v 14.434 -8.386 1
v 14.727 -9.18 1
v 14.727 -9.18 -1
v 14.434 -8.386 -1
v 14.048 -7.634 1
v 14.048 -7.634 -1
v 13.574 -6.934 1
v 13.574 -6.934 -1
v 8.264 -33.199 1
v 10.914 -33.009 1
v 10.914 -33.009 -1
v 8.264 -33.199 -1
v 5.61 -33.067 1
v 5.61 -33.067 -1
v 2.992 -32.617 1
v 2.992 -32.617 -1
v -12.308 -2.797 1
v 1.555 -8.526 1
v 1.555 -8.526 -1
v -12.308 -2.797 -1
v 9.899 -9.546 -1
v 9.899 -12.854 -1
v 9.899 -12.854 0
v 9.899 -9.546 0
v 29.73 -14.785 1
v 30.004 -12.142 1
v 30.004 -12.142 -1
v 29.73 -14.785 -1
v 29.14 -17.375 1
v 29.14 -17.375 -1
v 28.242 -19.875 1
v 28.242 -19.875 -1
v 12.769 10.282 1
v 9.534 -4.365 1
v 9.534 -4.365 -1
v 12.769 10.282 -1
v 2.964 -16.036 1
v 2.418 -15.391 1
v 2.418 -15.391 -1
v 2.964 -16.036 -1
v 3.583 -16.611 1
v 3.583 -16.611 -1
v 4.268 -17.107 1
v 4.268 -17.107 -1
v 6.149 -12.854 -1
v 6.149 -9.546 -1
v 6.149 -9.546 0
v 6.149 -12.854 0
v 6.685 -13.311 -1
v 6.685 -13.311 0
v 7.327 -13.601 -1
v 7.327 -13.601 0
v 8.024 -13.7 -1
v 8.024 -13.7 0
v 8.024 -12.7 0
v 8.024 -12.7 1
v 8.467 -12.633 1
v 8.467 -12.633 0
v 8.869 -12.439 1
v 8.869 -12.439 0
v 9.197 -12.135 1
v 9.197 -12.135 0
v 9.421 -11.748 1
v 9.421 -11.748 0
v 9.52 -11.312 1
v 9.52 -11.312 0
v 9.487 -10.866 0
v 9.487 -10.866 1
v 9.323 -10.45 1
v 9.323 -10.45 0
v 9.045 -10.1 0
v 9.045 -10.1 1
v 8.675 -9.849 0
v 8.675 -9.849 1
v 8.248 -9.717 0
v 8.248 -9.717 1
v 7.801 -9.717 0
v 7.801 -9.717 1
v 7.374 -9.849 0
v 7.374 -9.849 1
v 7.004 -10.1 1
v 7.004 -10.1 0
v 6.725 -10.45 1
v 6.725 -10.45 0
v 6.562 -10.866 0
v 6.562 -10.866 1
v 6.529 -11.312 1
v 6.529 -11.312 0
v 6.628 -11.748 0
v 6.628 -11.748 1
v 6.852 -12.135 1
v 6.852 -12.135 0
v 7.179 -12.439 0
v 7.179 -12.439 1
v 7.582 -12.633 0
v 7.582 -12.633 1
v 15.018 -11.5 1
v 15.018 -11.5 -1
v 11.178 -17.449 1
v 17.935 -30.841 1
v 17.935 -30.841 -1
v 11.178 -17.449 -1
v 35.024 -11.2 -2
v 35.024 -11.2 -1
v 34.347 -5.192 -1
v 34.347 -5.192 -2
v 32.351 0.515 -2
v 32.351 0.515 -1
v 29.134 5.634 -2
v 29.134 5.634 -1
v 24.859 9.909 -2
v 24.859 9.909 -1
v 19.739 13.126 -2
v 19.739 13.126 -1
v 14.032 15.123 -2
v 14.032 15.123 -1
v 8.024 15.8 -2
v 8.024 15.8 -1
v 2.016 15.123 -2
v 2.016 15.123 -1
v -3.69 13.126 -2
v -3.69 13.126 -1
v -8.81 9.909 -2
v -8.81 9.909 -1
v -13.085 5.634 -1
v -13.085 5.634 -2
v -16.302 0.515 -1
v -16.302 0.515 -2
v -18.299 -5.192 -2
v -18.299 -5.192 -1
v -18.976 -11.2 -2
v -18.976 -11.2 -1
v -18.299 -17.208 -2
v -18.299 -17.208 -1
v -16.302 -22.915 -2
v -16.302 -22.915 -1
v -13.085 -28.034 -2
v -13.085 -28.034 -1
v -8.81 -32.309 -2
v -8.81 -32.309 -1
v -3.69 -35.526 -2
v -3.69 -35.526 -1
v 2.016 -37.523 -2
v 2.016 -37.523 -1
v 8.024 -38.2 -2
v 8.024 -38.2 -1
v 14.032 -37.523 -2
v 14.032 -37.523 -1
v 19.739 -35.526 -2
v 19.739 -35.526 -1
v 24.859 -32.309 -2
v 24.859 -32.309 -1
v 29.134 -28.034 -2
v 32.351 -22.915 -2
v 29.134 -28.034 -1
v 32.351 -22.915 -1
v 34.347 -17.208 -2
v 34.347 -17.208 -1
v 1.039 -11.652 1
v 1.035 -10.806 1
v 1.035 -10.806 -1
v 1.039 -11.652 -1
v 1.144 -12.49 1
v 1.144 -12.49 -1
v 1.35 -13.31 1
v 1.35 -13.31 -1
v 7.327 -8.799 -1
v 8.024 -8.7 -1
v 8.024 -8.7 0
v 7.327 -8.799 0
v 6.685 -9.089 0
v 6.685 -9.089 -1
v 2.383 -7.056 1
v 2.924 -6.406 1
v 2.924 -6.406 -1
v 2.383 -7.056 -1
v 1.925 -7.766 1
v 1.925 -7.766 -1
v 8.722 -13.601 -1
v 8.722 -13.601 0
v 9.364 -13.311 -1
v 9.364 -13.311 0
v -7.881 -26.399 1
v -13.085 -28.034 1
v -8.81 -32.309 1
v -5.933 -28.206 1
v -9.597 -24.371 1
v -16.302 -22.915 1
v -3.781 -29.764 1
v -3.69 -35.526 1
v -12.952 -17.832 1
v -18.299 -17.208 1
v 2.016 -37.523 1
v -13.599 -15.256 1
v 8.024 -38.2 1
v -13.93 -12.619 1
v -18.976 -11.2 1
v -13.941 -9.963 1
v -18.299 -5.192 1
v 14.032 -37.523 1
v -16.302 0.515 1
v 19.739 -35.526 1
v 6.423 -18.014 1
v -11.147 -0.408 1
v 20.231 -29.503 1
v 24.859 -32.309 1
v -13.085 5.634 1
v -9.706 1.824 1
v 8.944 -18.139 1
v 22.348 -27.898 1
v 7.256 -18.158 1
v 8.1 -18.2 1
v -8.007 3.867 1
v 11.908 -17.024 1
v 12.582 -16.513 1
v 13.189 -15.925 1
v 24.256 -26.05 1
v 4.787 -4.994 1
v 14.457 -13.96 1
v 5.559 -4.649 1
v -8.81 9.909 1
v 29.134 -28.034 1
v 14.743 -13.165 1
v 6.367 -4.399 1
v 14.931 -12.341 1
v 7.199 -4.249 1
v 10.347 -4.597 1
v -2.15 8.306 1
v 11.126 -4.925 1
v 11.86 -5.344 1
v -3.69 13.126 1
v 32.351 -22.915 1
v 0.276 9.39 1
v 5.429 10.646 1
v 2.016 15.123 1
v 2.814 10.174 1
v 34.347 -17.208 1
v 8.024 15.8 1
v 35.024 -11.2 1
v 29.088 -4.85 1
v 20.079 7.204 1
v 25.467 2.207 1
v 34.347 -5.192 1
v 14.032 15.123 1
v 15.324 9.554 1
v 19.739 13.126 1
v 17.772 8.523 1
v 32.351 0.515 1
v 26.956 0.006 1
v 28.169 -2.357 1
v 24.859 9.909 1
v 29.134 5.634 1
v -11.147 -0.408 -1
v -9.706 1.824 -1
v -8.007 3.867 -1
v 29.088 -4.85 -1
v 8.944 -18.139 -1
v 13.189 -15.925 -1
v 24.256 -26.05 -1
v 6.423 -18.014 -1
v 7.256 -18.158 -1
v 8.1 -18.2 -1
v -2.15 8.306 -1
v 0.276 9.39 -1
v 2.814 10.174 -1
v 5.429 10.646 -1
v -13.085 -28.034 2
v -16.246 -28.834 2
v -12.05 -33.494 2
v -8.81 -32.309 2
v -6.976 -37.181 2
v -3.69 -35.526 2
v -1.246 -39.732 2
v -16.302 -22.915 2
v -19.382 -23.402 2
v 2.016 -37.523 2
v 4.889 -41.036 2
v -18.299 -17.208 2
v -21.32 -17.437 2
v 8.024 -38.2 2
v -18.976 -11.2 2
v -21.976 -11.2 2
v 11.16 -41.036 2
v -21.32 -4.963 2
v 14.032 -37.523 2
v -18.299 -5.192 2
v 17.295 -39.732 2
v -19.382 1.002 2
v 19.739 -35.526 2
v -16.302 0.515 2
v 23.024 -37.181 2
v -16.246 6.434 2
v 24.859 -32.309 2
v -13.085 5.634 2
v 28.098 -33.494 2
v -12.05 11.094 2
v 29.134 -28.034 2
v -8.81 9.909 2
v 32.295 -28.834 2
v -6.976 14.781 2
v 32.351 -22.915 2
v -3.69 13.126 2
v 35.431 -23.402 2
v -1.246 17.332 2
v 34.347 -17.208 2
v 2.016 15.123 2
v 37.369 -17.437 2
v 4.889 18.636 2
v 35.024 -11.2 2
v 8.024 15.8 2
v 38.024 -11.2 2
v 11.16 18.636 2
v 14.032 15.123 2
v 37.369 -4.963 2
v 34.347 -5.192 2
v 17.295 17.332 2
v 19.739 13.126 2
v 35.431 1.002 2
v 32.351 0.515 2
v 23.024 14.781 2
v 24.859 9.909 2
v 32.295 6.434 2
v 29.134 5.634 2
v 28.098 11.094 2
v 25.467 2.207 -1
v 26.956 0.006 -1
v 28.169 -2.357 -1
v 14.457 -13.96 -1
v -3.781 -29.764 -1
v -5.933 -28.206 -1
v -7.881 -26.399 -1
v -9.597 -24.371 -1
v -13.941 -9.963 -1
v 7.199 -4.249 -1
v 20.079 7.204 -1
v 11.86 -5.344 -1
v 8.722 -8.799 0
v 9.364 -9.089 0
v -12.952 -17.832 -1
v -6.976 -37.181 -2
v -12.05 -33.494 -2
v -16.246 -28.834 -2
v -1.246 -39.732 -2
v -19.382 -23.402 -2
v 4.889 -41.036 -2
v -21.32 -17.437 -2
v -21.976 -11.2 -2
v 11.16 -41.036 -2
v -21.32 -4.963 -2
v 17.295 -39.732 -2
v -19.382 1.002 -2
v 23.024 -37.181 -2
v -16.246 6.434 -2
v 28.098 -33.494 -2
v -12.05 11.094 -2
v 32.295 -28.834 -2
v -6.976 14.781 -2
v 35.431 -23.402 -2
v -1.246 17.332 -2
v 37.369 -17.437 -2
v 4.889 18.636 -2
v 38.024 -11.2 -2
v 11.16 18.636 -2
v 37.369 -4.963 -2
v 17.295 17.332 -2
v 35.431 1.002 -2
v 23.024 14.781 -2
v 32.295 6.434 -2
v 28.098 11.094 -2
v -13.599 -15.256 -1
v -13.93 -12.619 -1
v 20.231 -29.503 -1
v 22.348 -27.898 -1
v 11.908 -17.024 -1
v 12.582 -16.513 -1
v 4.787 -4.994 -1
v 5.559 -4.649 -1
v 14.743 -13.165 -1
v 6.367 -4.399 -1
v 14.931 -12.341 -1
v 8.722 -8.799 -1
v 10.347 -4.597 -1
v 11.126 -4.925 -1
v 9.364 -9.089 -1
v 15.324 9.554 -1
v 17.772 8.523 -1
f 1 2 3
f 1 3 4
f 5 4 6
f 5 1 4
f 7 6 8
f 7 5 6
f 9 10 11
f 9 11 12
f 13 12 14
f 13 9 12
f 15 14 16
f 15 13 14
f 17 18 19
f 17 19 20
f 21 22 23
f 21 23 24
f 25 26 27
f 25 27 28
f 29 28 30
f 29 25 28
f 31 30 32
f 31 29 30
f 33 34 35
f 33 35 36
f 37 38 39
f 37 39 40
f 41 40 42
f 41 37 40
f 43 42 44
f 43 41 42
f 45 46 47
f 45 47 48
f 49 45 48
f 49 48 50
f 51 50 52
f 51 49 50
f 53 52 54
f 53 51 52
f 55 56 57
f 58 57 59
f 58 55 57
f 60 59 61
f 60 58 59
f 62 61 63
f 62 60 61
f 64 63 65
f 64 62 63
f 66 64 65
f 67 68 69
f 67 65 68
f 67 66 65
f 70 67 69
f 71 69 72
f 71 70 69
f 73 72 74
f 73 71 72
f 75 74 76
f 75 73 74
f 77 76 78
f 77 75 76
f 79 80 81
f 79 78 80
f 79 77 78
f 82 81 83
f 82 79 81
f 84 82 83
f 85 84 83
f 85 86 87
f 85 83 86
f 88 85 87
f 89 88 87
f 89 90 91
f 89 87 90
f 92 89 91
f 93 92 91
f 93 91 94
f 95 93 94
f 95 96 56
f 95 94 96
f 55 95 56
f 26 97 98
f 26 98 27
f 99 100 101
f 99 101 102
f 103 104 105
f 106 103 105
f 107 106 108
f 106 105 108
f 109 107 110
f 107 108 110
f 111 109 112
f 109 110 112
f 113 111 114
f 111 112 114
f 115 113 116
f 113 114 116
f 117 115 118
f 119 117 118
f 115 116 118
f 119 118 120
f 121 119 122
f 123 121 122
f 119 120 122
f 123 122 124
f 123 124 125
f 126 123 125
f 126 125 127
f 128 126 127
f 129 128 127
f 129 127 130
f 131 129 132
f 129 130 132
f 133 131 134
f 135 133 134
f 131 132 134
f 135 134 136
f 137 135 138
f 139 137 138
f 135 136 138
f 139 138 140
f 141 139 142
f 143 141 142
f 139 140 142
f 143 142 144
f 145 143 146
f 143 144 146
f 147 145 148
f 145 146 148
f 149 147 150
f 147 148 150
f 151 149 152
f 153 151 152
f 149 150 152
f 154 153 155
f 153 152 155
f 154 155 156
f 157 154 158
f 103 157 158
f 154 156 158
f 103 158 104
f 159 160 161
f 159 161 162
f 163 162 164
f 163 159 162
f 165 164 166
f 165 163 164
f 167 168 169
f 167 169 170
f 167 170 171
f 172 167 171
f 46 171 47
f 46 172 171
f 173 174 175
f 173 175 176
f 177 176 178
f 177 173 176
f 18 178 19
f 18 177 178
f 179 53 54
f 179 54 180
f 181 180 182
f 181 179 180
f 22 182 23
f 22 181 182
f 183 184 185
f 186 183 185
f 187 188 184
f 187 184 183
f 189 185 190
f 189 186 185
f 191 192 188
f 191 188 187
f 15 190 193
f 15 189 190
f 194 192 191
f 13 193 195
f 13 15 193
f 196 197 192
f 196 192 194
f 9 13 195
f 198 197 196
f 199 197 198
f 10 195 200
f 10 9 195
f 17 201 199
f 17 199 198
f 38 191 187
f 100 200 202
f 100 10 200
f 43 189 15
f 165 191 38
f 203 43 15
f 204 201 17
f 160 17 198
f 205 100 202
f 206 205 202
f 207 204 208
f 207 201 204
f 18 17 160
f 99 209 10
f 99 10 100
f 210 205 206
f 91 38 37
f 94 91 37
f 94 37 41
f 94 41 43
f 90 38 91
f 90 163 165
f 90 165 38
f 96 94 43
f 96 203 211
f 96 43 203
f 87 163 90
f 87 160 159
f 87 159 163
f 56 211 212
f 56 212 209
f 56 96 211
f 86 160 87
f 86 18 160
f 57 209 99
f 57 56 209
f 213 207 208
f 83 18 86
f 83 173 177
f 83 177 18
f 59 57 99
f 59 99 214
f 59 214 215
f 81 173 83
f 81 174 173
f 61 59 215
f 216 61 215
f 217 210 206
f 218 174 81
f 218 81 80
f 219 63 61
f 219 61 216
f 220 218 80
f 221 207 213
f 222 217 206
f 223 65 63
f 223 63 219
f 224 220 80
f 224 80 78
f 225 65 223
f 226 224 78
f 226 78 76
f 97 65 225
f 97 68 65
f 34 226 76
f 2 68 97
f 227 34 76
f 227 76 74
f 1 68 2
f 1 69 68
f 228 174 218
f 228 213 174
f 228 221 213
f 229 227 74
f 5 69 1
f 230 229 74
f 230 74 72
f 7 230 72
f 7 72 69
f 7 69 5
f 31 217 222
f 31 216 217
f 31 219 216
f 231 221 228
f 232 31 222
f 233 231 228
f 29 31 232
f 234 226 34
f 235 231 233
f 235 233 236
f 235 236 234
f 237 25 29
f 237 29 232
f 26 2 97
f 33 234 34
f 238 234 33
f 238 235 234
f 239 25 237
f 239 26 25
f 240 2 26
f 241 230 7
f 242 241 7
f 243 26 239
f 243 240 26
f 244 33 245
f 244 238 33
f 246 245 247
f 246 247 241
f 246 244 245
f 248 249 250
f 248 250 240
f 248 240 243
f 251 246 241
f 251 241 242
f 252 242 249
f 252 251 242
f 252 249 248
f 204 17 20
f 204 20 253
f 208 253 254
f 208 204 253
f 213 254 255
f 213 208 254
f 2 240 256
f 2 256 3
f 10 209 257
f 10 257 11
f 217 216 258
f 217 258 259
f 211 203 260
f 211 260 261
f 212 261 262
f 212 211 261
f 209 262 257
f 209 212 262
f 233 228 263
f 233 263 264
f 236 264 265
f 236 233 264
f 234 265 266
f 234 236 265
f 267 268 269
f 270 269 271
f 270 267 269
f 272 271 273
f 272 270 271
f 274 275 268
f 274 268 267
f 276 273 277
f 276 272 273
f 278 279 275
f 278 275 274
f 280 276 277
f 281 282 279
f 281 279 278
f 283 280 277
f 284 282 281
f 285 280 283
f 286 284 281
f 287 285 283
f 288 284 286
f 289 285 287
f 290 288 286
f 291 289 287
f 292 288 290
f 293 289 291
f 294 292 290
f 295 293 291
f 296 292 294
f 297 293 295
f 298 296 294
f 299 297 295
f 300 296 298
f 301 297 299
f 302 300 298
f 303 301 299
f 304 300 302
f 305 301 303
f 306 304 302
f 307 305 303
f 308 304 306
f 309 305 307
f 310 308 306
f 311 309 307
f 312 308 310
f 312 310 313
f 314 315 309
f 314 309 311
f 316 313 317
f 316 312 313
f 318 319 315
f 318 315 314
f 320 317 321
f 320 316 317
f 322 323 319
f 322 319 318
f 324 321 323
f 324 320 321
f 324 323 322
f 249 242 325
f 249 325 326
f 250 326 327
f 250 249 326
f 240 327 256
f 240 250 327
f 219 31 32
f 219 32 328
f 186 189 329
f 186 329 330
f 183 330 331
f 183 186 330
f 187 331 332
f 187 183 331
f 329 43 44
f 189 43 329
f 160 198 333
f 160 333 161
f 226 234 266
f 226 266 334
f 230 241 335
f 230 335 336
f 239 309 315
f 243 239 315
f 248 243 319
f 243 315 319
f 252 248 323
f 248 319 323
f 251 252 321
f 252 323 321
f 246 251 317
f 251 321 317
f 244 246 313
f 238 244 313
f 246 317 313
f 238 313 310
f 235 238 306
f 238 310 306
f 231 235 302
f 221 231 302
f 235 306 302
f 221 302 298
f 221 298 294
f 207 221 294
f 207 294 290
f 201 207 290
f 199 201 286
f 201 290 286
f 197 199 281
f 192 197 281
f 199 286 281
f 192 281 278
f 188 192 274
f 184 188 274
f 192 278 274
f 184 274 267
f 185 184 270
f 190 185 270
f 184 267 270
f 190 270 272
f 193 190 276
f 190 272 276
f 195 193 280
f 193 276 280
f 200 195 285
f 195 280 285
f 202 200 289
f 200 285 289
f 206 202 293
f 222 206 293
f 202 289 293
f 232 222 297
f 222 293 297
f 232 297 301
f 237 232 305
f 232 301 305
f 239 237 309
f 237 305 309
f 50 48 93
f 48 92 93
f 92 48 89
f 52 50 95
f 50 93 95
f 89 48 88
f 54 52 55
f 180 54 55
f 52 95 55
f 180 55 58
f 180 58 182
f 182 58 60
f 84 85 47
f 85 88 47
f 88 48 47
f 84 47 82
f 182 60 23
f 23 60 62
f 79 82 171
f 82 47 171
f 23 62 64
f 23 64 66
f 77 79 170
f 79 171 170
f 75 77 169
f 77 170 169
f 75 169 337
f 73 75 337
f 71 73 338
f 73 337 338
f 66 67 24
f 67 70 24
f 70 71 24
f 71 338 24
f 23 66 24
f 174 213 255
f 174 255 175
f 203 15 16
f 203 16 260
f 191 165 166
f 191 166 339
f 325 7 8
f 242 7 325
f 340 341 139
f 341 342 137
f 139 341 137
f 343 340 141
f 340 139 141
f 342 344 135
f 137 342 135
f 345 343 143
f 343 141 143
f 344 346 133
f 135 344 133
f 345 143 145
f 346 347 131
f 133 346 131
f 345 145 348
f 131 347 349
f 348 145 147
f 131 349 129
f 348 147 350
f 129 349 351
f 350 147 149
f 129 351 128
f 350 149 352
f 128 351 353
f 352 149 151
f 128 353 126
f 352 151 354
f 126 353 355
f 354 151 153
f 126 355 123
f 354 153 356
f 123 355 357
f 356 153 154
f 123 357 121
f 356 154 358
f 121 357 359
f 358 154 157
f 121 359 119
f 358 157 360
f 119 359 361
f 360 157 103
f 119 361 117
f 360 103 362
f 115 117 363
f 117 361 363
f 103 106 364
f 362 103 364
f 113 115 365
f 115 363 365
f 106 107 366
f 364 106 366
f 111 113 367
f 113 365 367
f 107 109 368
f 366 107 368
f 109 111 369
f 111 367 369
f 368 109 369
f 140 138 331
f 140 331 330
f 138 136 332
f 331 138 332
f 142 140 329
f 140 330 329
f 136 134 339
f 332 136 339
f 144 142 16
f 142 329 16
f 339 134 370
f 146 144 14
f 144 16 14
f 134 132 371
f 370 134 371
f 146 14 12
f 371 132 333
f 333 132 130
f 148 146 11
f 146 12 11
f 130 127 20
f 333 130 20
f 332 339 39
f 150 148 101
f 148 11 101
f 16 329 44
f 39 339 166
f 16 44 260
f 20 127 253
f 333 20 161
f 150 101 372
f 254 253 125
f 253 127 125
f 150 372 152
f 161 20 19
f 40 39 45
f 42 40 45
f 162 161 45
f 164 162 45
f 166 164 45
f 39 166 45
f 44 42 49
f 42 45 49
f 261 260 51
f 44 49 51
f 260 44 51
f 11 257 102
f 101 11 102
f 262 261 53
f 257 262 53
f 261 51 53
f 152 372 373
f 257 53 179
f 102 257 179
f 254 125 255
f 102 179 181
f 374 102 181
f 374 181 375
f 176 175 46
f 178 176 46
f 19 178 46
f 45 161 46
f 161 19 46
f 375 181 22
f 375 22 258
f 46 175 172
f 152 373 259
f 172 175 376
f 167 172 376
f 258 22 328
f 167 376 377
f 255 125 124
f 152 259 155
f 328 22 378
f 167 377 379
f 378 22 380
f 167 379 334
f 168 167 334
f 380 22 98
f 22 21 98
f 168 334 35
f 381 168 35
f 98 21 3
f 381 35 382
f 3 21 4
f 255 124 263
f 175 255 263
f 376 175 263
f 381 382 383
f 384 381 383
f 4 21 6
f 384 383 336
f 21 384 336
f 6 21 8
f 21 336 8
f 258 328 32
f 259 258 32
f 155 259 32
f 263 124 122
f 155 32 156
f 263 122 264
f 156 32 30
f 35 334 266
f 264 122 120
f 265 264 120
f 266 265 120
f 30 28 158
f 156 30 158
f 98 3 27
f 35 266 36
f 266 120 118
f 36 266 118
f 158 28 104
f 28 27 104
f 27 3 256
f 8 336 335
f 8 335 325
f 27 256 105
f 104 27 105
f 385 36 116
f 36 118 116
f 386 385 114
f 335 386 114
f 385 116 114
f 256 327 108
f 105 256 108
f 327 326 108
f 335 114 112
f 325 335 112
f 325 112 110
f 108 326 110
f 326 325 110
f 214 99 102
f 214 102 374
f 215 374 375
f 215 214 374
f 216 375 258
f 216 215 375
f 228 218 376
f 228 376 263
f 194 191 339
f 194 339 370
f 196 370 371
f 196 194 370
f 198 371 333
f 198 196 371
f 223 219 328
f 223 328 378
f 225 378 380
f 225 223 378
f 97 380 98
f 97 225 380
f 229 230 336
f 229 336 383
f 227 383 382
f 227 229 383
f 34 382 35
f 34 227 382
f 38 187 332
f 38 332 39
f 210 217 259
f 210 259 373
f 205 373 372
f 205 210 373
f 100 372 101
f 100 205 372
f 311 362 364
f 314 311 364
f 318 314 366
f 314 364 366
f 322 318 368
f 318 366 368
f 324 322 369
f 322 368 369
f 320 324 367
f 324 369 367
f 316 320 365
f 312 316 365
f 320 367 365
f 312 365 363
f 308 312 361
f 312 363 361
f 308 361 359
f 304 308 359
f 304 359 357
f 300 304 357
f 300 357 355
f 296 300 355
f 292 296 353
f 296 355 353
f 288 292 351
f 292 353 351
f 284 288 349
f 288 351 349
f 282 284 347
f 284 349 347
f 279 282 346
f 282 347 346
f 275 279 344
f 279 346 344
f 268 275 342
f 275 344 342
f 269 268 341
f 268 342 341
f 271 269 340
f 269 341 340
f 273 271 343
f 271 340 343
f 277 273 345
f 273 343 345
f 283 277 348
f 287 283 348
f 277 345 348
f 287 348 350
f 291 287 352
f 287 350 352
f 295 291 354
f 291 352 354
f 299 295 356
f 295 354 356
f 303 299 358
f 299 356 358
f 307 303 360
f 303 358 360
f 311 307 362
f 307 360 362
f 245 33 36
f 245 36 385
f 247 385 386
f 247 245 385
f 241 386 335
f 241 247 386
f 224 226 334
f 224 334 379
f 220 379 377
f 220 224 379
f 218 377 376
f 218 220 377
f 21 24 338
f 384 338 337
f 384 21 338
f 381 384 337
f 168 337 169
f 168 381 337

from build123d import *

# Parameters (mm, degrees)
BOSS_EXTRU_1_START      = -2
ESQUISSE1_R             = 30
BOSS_EXTRU_1_DEPTH      = 4
BOSS_EXTRU_2_DEPTH      = 2
ENL_V_MAT_EXTRU_1_DEPTH = 12
ESQUISSE2_3_R           = 27
ENL_V_MAT_EXTRU_2_DEPTH = 1
ENL_V_START             = -3
ESQUISSE2_4_R           = 27
ENL_V_MAT_EXTRU_3_DEPTH = 1


with BuildPart() as part:
    # Esquisse1 → Boss.-Extru.1 (new body)
    with BuildSketch(Plane.XY.offset(BOSS_EXTRU_1_START)):
        with Locations((8.02441701, -11.2)):
            Circle(ESQUISSE1_R)
        with BuildLine():
            ThreePointArc((8.02441701, -13.7), (9.053011579, -13.478594569), (9.89941701, -12.853594569))
            Line((9.89941701, -12.853594569), (9.89941701, -9.546405431))
            ThreePointArc((9.89941701, -9.546405431), (9.053011579, -8.921405431), (8.02441701, -8.7))
            ThreePointArc((8.02441701, -8.7), (6.99582244, -8.921405431), (6.14941701, -9.546405431))
            Line((6.14941701, -9.546405431), (6.14941701, -12.853594569))
            ThreePointArc((6.14941701, -12.853594569), (6.99582244, -13.478594569), (8.02441701, -13.7))
        make_face(mode=Mode.SUBTRACT)
    extrude(amount=BOSS_EXTRU_1_DEPTH)

    # Esquisse1<3> → Boss.-Extru.2 (add)
    with BuildSketch(Plane.XY):
        with BuildLine():
            ThreePointArc((6.14941701, -12.853594569), (6.99582244, -13.478594569), (8.02441701, -13.7))
            ThreePointArc((8.02441701, -13.7), (9.053011579, -13.478594569), (9.89941701, -12.853594569))
            Line((9.89941701, -12.853594569), (9.89941701, -9.546405431))
            ThreePointArc((9.89941701, -9.546405431), (9.053011579, -8.921405431), (8.02441701, -8.7))
            ThreePointArc((8.02441701, -8.7), (6.99582244, -8.921405431), (6.14941701, -9.546405431))
            Line((6.14941701, -9.546405431), (6.14941701, -12.853594569))
        make_face()
        with BuildLine():
            ThreePointArc((8.02441701, -9.7), (6.52441701, -11.2), (8.02441701, -12.7))
            ThreePointArc((8.02441701, -12.7), (9.52441701, -11.2), (8.02441701, -9.7))
        make_face(mode=Mode.SUBTRACT)
    extrude(amount=BOSS_EXTRU_2_DEPTH)

    # Esquisse2 → Enlèv. mat.-Extru.1 (cut)
    with BuildSketch(Plane.XY.offset(2)):
        with BuildLine():
            ThreePointArc((11.17793162, -17.449427622), (12.252818192, -16.778586151), (13.189167721, -15.924970909))
            Line((13.189167721, -15.924970909), (24.256490673, -26.049908572))
            ThreePointArc((24.256490673, -26.049908572), (21.313677868, -28.732699331), (17.935462929, -30.84105824))
            Line((17.935462929, -30.84105824), (11.17793162, -17.449427622))
        make_face()
        with BuildLine():
            ThreePointArc((14.457203996, -13.960299184), (14.849406296, -12.755481033), (15.017998348, -11.499699945))
            Line((15.017998348, -11.499699945), (30.004244075, -12.141914112))
            ThreePointArc((30.004244075, -12.141914112), (29.474383338, -16.088654674), (28.241747539, -19.875226006))
            Line((28.241747539, -19.875226006), (14.457203996, -13.960299184))
        make_face()
        with BuildLine():
            ThreePointArc((6.423094711, -18.014379421), (7.677714181, -18.19140881), (8.943692835, -18.139375473))
            Line((8.943692835, -18.139375473), (10.913569605, -33.009465772))
            ThreePointArc((10.913569605, -33.009465772), (6.934779549, -33.172999117), (2.991689784, -32.616621038))
            Line((2.991689784, -32.616621038), (6.423094711, -18.014379421))
        make_face()
        with BuildLine():
            ThreePointArc((2.417534301, -15.390807356), (3.264836277, -16.332873586), (4.268078575, -17.106769131))
            Line((4.268078575, -17.106769131), (-3.781218072, -29.764131553))
            ThreePointArc((-3.781218072, -29.764131553), (-6.934265292, -27.331888414), (-9.59721436, -24.371108833))
            Line((-9.59721436, -24.371108833), (2.417534301, -15.390807356))
        make_face()
        with BuildLine():
            ThreePointArc((1.035496625, -10.806309953), (1.079019095, -12.072609766), (1.350096815, -13.310319865))
            Line((1.350096815, -13.310319865), (-12.952017889, -17.832433863))
            ThreePointArc((-12.952017889, -17.832433863), (-13.803976437, -13.942487836), (-13.940761343, -9.962688424))
            Line((-13.940761343, -9.962688424), (1.035496625, -10.806309953))
        make_face()
        with BuildLine():
            ThreePointArc((2.923652469, -6.406024499), (2.143030786, -7.404042138), (1.555103651, -8.526428482))
            Line((1.555103651, -8.526428482), (-12.30771069, -2.797346657))
            ThreePointArc((-12.30771069, -2.797346657), (-10.459939693, 0.73015328), (-8.00655726, 3.866780147))
            Line((-8.00655726, 3.866780147), (2.923652469, -6.406024499))
        make_face()
        with BuildLine():
            ThreePointArc((7.198512731, -4.248893461), (5.959008456, -4.511645381), (4.787174106, -4.993530925))
            Line((4.787174106, -4.993530925), (-2.149774974, 8.306045665))
            ThreePointArc((-2.149774974, 8.306045665), (1.533132983, 9.820543087), (5.428717849, 10.646334838))
            Line((5.428717849, 10.646334838), (7.198512731, -4.248893461))
        make_face()
        with BuildLine():
            ThreePointArc((11.859822784, -5.344262425), (10.741413742, -4.748804083), (9.533986494, -4.364709225))
            Line((9.533986494, -4.364709225), (12.768778245, 10.282342434))
            ThreePointArc((12.768778245, 10.282342434), (16.563549598, 9.075187167), (20.078549443, 7.203746664))
            Line((20.078549443, 7.203746664), (11.859822784, -5.344262425))
        make_face()
        with BuildLine():
            ThreePointArc((14.726503849, -9.17959608), (14.252506061, -8.004549052), (13.574454543, -6.934196045))
            Line((13.574454543, -6.934196045), (25.467392114, 2.206812429))
            ThreePointArc((25.467392114, 2.206812429), (27.598411173, -1.157154163), (29.088118504, -4.850159109))
            Line((29.088118504, -4.850159109), (14.726503849, -9.17959608))
        make_face()
    extrude(amount=-ENL_V_MAT_EXTRU_1_DEPTH, mode=Mode.SUBTRACT)

    # Esquisse2<3> → Enlèv. mat.-Extru.2 (cut)
    with BuildSketch(Plane.XY.offset(2)):
        with Locations((8.02441701, -11.2)):
            Circle(ESQUISSE2_3_R)
        with BuildLine():
            Line((-9.59721436, -24.371108833), (2.417534301, -15.390807356))
            ThreePointArc((2.417534301, -15.390807356), (3.264836277, -16.332873586), (4.268078575, -17.106769131))
            Line((4.268078575, -17.106769131), (-3.781218072, -29.764131553))
            ThreePointArc((-3.781218072, -29.764131553), (-6.934265292, -27.331888414), (-9.59721436, -24.371108833))
        make_face(mode=Mode.SUBTRACT)
        with BuildLine():
            Line((-13.940761343, -9.962688424), (1.035496625, -10.806309953))
            ThreePointArc((1.035496625, -10.806309953), (1.079019095, -12.072609766), (1.350096815, -13.310319865))
            Line((1.350096815, -13.310319865), (-12.952017889, -17.832433863))
            ThreePointArc((-12.952017889, -17.832433863), (-13.803976437, -13.942487836), (-13.940761343, -9.962688424))
        make_face(mode=Mode.SUBTRACT)
        with BuildLine():
            Line((-8.00655726, 3.866780147), (2.923652469, -6.406024499))
            ThreePointArc((2.923652469, -6.406024499), (2.143030786, -7.404042138), (1.555103651, -8.526428482))
            Line((1.555103651, -8.526428482), (-12.30771069, -2.797346657))
            ThreePointArc((-12.30771069, -2.797346657), (-10.459939693, 0.73015328), (-8.00655726, 3.866780147))
        make_face(mode=Mode.SUBTRACT)
        with BuildLine():
            Line((5.428717849, 10.646334838), (7.198512731, -4.248893461))
            ThreePointArc((7.198512731, -4.248893461), (5.959008456, -4.511645381), (4.787174106, -4.993530925))
            Line((4.787174106, -4.993530925), (-2.149774974, 8.306045665))
            ThreePointArc((-2.149774974, 8.306045665), (1.533132983, 9.820543087), (5.428717849, 10.646334838))
        make_face(mode=Mode.SUBTRACT)
        with BuildLine():
            Line((20.078549443, 7.203746664), (11.859822784, -5.344262425))
            ThreePointArc((11.859822784, -5.344262425), (10.741413742, -4.748804083), (9.533986494, -4.364709225))
            Line((9.533986494, -4.364709225), (12.768778245, 10.282342434))
            ThreePointArc((12.768778245, 10.282342434), (16.563549598, 9.075187167), (20.078549443, 7.203746664))
        make_face(mode=Mode.SUBTRACT)
        with BuildLine():
            Line((29.088118504, -4.850159109), (14.726503849, -9.17959608))
            ThreePointArc((14.726503849, -9.17959608), (14.252506061, -8.004549052), (13.574454543, -6.934196045))
            Line((13.574454543, -6.934196045), (25.467392114, 2.206812429))
            ThreePointArc((25.467392114, 2.206812429), (27.598411173, -1.157154163), (29.088118504, -4.850159109))
        make_face(mode=Mode.SUBTRACT)
        with BuildLine():
            Line((28.241747539, -19.875226006), (14.457203996, -13.960299184))
            ThreePointArc((14.457203996, -13.960299184), (14.849406296, -12.755481033), (15.017998348, -11.499699945))
            Line((15.017998348, -11.499699945), (30.004244075, -12.141914112))
            ThreePointArc((30.004244075, -12.141914112), (29.474383338, -16.088654674), (28.241747539, -19.875226006))
        make_face(mode=Mode.SUBTRACT)
        with BuildLine():
            Line((17.935462929, -30.84105824), (11.17793162, -17.449427622))
            ThreePointArc((11.17793162, -17.449427622), (12.252818192, -16.778586151), (13.189167721, -15.924970909))
            Line((13.189167721, -15.924970909), (24.256490673, -26.049908572))
            ThreePointArc((24.256490673, -26.049908572), (21.313677868, -28.732699331), (17.935462929, -30.84105824))
        make_face(mode=Mode.SUBTRACT)
        with BuildLine():
            Line((2.991689784, -32.616621038), (6.423094711, -18.014379421))
            ThreePointArc((6.423094711, -18.014379421), (7.677714181, -18.19140881), (8.943692835, -18.139375473))
            Line((8.943692835, -18.139375473), (10.913569605, -33.009465772))
            ThreePointArc((10.913569605, -33.009465772), (6.934779549, -33.172999117), (2.991689784, -32.616621038))
        make_face(mode=Mode.SUBTRACT)
    extrude(amount=-ENL_V_MAT_EXTRU_2_DEPTH, mode=Mode.SUBTRACT)

    # Esquisse2<4> → Enlèv. mat.-Extru.3 (cut)
    with BuildSketch(Plane.XY.offset(2).offset(ENL_V_START)):
        with Locations((8.02441701, -11.2)):
            Circle(ESQUISSE2_4_R)
        with BuildLine():
            Line((-9.59721436, -24.371108833), (2.417534301, -15.390807356))
            ThreePointArc((2.417534301, -15.390807356), (3.264836277, -16.332873586), (4.268078575, -17.106769131))
            Line((4.268078575, -17.106769131), (-3.781218072, -29.764131553))
            ThreePointArc((-3.781218072, -29.764131553), (-6.934265292, -27.331888414), (-9.59721436, -24.371108833))
        make_face(mode=Mode.SUBTRACT)
        with BuildLine():
            Line((-13.940761343, -9.962688424), (1.035496625, -10.806309953))
            ThreePointArc((1.035496625, -10.806309953), (1.079019095, -12.072609766), (1.350096815, -13.310319865))
            Line((1.350096815, -13.310319865), (-12.952017889, -17.832433863))
            ThreePointArc((-12.952017889, -17.832433863), (-13.803976437, -13.942487836), (-13.940761343, -9.962688424))
        make_face(mode=Mode.SUBTRACT)
        with BuildLine():
            Line((-8.00655726, 3.866780147), (2.923652469, -6.406024499))
            ThreePointArc((2.923652469, -6.406024499), (2.143030786, -7.404042138), (1.555103651, -8.526428482))
            Line((1.555103651, -8.526428482), (-12.30771069, -2.797346657))
            ThreePointArc((-12.30771069, -2.797346657), (-10.459939693, 0.73015328), (-8.00655726, 3.866780147))
        make_face(mode=Mode.SUBTRACT)
        with BuildLine():
            Line((5.428717849, 10.646334838), (7.198512731, -4.248893461))
            ThreePointArc((7.198512731, -4.248893461), (5.959008456, -4.511645381), (4.787174106, -4.993530925))
            Line((4.787174106, -4.993530925), (-2.149774974, 8.306045665))
            ThreePointArc((-2.149774974, 8.306045665), (1.533132983, 9.820543087), (5.428717849, 10.646334838))
        make_face(mode=Mode.SUBTRACT)
        with BuildLine():
            Line((20.078549443, 7.203746664), (11.859822784, -5.344262425))
            ThreePointArc((11.859822784, -5.344262425), (10.741413742, -4.748804083), (9.533986494, -4.364709225))
            Line((9.533986494, -4.364709225), (12.768778245, 10.282342434))
            ThreePointArc((12.768778245, 10.282342434), (16.563549598, 9.075187167), (20.078549443, 7.203746664))
        make_face(mode=Mode.SUBTRACT)
        with BuildLine():
            Line((29.088118504, -4.850159109), (14.726503849, -9.17959608))
            ThreePointArc((14.726503849, -9.17959608), (14.252506061, -8.004549052), (13.574454543, -6.934196045))
            Line((13.574454543, -6.934196045), (25.467392114, 2.206812429))
            ThreePointArc((25.467392114, 2.206812429), (27.598411173, -1.157154163), (29.088118504, -4.850159109))
        make_face(mode=Mode.SUBTRACT)
        with BuildLine():
            Line((28.241747539, -19.875226006), (14.457203996, -13.960299184))
            ThreePointArc((14.457203996, -13.960299184), (14.849406296, -12.755481033), (15.017998348, -11.499699945))
            Line((15.017998348, -11.499699945), (30.004244075, -12.141914112))
            ThreePointArc((30.004244075, -12.141914112), (29.474383338, -16.088654674), (28.241747539, -19.875226006))
        make_face(mode=Mode.SUBTRACT)
        with BuildLine():
            Line((17.935462929, -30.84105824), (11.17793162, -17.449427622))
            ThreePointArc((11.17793162, -17.449427622), (12.252818192, -16.778586151), (13.189167721, -15.924970909))
            Line((13.189167721, -15.924970909), (24.256490673, -26.049908572))
            ThreePointArc((24.256490673, -26.049908572), (21.313677868, -28.732699331), (17.935462929, -30.84105824))
        make_face(mode=Mode.SUBTRACT)
        with BuildLine():
            Line((2.991689784, -32.616621038), (6.423094711, -18.014379421))
            ThreePointArc((6.423094711, -18.014379421), (7.677714181, -18.19140881), (8.943692835, -18.139375473))
            Line((8.943692835, -18.139375473), (10.913569605, -33.009465772))
            ThreePointArc((10.913569605, -33.009465772), (6.934779549, -33.172999117), (2.991689784, -32.616621038))
        make_face(mode=Mode.SUBTRACT)
    extrude(amount=-ENL_V_MAT_EXTRU_3_DEPTH, mode=Mode.SUBTRACT)


solid = part.part
